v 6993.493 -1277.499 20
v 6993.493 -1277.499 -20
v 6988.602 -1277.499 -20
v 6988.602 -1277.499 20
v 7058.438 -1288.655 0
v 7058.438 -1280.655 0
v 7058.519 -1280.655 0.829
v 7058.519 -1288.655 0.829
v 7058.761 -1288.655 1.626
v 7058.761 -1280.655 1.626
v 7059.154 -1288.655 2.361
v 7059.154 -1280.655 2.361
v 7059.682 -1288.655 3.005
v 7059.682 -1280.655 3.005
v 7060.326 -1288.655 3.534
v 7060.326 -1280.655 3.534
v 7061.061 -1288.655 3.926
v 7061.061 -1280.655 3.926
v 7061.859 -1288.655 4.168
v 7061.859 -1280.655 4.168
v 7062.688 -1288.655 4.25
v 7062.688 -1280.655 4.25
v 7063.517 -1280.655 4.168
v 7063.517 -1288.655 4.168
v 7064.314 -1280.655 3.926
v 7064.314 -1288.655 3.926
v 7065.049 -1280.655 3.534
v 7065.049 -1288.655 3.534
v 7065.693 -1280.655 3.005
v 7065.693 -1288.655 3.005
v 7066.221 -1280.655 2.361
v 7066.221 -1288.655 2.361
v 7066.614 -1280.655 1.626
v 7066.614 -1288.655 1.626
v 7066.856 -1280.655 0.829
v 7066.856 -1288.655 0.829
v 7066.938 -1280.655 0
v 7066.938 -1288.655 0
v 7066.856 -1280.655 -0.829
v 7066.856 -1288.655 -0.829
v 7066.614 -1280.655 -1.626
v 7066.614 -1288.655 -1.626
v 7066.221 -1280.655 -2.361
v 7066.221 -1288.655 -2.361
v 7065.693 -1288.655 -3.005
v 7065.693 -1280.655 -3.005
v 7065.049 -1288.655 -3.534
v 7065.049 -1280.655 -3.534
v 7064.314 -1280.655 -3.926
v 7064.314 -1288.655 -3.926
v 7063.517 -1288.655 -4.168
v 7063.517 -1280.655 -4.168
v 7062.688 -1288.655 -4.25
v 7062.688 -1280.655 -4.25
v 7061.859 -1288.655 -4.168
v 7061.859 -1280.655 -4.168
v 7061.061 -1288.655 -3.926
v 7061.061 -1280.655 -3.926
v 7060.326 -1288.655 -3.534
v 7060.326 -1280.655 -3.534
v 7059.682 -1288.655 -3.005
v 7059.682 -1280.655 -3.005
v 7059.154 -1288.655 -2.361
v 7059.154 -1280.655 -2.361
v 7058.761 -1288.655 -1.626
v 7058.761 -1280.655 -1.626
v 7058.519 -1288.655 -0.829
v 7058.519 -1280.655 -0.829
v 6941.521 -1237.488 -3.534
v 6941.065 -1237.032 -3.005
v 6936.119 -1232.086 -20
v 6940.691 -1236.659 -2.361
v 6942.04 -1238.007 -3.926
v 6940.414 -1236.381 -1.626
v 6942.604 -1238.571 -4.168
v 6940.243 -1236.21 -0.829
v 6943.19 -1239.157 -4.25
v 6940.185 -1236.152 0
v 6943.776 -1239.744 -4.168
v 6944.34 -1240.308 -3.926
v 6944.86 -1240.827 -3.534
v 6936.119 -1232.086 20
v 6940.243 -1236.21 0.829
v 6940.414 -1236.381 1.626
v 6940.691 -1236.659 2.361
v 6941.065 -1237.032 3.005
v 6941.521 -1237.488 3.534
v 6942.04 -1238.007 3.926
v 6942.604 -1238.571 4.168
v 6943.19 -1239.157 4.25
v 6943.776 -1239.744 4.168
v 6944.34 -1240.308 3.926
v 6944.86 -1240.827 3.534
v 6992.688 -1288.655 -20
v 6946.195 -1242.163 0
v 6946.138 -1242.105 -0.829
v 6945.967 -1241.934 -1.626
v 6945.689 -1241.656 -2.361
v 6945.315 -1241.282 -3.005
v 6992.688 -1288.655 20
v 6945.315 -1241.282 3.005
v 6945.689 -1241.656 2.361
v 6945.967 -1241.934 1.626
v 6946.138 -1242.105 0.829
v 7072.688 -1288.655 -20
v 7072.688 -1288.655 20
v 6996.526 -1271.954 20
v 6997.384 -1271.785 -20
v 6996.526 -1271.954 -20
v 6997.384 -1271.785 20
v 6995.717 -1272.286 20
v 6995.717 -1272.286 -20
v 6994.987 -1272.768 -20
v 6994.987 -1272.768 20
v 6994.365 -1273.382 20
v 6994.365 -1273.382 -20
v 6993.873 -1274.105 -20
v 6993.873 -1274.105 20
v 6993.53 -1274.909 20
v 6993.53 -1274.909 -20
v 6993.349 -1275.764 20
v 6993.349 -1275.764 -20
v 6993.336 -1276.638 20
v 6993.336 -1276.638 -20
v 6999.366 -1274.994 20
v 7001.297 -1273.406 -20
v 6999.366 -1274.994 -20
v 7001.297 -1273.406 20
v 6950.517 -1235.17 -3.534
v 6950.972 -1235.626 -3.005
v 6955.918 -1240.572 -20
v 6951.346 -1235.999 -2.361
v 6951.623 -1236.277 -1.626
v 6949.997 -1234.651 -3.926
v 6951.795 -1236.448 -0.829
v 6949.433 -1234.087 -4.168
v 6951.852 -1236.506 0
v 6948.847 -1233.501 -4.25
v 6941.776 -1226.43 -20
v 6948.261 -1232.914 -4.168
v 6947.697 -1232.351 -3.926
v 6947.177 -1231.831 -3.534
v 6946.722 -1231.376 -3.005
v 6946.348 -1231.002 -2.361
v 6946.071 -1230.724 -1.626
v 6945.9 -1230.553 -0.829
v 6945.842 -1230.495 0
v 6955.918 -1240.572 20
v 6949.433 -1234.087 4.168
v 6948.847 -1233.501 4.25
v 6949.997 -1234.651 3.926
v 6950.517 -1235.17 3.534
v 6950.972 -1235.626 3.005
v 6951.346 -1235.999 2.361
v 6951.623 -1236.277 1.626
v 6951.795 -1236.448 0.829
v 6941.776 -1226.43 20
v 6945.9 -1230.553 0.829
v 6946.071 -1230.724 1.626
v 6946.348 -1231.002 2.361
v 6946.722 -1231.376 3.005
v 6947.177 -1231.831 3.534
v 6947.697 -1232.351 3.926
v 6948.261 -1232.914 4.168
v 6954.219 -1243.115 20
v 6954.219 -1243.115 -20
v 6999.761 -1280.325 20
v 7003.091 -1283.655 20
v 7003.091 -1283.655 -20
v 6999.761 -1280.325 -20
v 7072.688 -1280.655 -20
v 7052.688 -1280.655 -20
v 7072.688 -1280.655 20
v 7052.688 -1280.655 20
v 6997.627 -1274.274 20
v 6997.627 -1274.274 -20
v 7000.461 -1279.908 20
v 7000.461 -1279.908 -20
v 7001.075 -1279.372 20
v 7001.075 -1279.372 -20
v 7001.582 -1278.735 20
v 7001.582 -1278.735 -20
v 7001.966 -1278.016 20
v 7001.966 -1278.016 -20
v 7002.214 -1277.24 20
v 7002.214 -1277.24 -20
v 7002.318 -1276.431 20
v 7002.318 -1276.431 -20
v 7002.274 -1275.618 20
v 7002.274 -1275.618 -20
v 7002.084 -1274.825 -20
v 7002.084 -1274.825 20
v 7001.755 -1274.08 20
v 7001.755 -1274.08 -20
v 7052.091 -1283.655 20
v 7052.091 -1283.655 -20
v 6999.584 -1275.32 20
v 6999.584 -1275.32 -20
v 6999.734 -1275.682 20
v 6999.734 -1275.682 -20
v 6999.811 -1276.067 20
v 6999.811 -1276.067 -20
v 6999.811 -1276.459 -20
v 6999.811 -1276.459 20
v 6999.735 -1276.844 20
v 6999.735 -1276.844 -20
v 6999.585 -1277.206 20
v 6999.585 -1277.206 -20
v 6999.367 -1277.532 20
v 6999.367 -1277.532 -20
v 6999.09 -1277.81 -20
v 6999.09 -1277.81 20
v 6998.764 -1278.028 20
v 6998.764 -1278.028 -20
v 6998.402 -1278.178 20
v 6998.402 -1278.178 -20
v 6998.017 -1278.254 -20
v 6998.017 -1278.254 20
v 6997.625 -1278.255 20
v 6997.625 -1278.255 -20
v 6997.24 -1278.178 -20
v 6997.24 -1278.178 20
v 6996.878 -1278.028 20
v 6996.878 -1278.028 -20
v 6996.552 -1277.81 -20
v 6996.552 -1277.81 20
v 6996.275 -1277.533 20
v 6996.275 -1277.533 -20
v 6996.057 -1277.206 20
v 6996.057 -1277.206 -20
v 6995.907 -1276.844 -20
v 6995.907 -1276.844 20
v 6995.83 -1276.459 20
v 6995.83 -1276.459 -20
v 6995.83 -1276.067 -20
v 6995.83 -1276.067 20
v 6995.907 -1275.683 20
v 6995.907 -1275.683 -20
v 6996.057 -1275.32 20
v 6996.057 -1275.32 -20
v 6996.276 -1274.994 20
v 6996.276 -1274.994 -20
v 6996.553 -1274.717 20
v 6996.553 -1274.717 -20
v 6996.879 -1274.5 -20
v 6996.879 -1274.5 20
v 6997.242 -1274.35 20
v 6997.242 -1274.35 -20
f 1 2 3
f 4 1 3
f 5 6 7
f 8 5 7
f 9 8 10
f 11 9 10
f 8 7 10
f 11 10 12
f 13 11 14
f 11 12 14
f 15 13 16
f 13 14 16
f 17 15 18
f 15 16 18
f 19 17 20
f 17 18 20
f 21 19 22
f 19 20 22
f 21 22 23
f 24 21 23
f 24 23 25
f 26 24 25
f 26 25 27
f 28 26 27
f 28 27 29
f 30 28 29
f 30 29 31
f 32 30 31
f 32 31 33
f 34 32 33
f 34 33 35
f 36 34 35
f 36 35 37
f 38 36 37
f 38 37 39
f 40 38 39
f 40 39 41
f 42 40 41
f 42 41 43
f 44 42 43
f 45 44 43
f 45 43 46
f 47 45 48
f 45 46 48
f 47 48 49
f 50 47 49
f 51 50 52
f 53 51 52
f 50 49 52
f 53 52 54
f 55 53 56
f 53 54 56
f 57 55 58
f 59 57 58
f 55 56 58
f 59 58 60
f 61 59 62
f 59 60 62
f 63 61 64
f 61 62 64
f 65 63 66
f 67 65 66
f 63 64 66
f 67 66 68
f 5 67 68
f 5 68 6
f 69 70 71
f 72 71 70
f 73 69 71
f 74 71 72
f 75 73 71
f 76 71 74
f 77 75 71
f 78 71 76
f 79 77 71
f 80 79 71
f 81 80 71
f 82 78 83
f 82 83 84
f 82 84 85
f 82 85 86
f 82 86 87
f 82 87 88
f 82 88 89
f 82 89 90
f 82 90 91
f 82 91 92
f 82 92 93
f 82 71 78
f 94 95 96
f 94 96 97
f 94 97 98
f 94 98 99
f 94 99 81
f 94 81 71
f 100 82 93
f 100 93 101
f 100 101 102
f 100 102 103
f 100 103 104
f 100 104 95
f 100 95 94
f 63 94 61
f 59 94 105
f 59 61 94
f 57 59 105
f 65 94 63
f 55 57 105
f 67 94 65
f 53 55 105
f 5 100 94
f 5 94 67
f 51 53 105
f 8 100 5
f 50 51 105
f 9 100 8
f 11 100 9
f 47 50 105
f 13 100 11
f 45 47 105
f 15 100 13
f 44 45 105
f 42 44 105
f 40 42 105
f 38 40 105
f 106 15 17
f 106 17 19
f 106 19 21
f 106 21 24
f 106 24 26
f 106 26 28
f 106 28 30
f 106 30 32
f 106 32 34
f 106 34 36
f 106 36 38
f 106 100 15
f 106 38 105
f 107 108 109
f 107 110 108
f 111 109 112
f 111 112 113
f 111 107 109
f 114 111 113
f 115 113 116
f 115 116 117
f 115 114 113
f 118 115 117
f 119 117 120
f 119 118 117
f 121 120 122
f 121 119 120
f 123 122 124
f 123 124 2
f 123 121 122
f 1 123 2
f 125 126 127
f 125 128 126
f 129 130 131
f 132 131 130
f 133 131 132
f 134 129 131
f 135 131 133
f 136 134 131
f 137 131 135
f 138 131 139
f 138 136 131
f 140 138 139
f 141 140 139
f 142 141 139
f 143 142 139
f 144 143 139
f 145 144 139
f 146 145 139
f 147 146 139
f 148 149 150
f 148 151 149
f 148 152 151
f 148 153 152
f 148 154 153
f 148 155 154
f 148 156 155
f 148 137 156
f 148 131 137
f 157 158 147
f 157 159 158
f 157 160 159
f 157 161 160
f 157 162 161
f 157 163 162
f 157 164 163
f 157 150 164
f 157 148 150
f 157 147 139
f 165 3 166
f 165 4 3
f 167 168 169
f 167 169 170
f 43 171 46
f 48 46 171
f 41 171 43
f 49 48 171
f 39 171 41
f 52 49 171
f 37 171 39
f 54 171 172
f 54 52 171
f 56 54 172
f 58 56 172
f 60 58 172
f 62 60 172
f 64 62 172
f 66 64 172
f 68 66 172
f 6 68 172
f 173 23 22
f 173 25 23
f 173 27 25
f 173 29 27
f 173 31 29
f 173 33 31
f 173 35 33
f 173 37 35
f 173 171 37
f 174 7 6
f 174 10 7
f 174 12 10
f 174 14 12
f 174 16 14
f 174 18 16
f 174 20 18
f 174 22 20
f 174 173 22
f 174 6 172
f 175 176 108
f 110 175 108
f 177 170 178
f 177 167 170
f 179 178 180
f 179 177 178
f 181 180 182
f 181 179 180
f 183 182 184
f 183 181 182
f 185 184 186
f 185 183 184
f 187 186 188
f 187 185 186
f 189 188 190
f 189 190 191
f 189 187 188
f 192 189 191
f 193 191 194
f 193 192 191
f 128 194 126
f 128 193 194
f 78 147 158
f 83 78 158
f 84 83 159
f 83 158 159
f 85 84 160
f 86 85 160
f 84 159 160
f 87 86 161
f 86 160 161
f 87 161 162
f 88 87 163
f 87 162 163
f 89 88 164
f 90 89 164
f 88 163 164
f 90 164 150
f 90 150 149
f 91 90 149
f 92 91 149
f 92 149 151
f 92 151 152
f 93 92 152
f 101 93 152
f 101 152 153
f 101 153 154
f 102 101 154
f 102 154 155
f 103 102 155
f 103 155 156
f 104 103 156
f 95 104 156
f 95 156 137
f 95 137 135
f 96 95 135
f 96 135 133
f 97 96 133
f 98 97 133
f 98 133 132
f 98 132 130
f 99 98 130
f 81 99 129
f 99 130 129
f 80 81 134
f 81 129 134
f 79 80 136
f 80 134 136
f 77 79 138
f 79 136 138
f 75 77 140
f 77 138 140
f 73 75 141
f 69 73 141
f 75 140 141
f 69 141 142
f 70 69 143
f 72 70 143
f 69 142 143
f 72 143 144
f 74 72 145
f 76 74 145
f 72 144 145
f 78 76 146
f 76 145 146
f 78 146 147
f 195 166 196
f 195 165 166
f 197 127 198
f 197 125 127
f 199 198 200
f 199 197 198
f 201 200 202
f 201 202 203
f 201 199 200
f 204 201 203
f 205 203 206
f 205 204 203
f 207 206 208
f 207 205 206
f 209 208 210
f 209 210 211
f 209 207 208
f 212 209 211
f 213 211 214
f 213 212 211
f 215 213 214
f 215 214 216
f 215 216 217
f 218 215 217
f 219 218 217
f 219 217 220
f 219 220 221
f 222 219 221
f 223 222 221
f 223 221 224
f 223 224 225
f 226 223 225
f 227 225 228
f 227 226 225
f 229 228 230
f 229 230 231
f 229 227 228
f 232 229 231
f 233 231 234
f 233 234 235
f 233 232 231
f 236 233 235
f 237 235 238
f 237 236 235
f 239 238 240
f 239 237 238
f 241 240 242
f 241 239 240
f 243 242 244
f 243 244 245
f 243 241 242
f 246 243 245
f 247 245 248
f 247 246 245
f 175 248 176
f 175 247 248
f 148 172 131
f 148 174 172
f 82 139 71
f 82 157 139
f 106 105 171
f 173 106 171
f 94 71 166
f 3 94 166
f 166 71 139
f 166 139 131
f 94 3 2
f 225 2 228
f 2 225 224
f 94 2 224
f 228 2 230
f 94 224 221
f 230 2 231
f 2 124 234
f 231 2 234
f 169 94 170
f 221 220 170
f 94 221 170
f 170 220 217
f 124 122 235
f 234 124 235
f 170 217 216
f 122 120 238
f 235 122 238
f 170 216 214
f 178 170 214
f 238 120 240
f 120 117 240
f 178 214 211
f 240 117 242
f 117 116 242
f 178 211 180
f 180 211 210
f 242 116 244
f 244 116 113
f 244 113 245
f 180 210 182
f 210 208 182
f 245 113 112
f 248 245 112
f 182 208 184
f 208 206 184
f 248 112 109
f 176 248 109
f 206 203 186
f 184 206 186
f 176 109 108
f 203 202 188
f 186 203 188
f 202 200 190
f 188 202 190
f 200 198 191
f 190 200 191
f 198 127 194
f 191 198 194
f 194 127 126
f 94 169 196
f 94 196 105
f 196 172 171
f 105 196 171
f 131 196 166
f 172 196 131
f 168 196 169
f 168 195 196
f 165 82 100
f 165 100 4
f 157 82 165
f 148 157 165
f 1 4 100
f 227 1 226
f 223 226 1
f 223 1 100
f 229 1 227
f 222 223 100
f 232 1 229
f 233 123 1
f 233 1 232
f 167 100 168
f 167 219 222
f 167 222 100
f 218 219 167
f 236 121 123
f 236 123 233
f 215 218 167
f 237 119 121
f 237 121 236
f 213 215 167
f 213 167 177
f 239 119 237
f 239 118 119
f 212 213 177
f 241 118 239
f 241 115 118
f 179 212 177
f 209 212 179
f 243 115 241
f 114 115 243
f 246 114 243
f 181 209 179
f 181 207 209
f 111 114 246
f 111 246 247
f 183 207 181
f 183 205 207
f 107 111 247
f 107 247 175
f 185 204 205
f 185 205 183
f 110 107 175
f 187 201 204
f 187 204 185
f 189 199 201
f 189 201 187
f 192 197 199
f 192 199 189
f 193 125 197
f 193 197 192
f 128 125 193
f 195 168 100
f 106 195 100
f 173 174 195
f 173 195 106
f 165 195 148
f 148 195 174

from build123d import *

# Parameters (mm, degrees)
EXTRUDE_1_DEPTH         = 20
HOLE_WIZARD_8_5_8_5_1_D = 8.5
HOLE_WIZARD_8_5_8_5_2_D = 8.5


with BuildPart() as part:
    # 草图1 → 凸台-拉伸1 (new, symmetric)
    with BuildSketch(Plane.XY):
        Polygon((6936.119122288, -1232.086390659), (6992.687664783, -1288.654933154), (7072.687664783, -1288.654933154), (7072.687664783, -1280.654933154), (7052.687664783, -1280.654933154), (6955.918112162, -1240.571672033), (6941.775976538, -1226.429536409), align=None)
        with BuildLine():
            Line((7009.090927681, -1283.654933154), (7003.090927681, -1283.654933154))
            Line((7003.090927681, -1283.654933154), (6999.760549745, -1280.324555218))
            ThreePointArc((6999.760549745, -1280.324555218), (7002.213755914, -1277.239517812), (7001.296666197, -1273.406161221))
            Line((7001.296666197, -1273.406161221), (6999.365595427, -1274.993916141))
            ThreePointArc((6999.365595427, -1274.993916141), (6997.055371947, -1278.111879141), (6997.626530039, -1274.273571671))
            Line((6997.626530039, -1274.273571671), (6997.383769074, -1271.785386165))
            ThreePointArc((6997.383769074, -1271.785386165), (6994.101203016, -1273.731324494), (6993.49338103, -1277.49861375))
            Line((6993.49338103, -1277.49861375), (6988.602413191, -1277.49861375))
            Line((6988.602413191, -1277.49861375), (6954.21874867, -1243.114949228))
            Line((6954.21874867, -1243.114949228), (7052.090927681, -1283.654933154))
            Line((7052.090927681, -1283.654933154), (7029.403393536, -1283.654933154))
            Line((7029.403393536, -1283.654933154), (7009.090927681, -1283.654933154))
        make_face(mode=Mode.SUBTRACT)
    extrude(amount=EXTRUDE_1_DEPTH, both=True)

    # Ø8.5 (8.5) 直径孔1 (through all)
    with Locations(Plane(origin=(2852.016365815, 2852.016365815, 0), x_dir=(0.7071067811865628, -0.7071067811865324, 0), z_dir=(-0.7071067811865324, -0.7071067811865628, 0))):
        with Locations((5785.79350833, 0)):
            Hole(HOLE_WIZARD_8_5_8_5_1_D / 2)

    # Ø8.5 (8.5) 直径孔2 (through all)
    with Locations(Plane.XZ.offset(1288.654933154)):
        with Locations((7062.687664783, 0)):
            Hole(HOLE_WIZARD_8_5_8_5_2_D / 2)


solid = part.part
